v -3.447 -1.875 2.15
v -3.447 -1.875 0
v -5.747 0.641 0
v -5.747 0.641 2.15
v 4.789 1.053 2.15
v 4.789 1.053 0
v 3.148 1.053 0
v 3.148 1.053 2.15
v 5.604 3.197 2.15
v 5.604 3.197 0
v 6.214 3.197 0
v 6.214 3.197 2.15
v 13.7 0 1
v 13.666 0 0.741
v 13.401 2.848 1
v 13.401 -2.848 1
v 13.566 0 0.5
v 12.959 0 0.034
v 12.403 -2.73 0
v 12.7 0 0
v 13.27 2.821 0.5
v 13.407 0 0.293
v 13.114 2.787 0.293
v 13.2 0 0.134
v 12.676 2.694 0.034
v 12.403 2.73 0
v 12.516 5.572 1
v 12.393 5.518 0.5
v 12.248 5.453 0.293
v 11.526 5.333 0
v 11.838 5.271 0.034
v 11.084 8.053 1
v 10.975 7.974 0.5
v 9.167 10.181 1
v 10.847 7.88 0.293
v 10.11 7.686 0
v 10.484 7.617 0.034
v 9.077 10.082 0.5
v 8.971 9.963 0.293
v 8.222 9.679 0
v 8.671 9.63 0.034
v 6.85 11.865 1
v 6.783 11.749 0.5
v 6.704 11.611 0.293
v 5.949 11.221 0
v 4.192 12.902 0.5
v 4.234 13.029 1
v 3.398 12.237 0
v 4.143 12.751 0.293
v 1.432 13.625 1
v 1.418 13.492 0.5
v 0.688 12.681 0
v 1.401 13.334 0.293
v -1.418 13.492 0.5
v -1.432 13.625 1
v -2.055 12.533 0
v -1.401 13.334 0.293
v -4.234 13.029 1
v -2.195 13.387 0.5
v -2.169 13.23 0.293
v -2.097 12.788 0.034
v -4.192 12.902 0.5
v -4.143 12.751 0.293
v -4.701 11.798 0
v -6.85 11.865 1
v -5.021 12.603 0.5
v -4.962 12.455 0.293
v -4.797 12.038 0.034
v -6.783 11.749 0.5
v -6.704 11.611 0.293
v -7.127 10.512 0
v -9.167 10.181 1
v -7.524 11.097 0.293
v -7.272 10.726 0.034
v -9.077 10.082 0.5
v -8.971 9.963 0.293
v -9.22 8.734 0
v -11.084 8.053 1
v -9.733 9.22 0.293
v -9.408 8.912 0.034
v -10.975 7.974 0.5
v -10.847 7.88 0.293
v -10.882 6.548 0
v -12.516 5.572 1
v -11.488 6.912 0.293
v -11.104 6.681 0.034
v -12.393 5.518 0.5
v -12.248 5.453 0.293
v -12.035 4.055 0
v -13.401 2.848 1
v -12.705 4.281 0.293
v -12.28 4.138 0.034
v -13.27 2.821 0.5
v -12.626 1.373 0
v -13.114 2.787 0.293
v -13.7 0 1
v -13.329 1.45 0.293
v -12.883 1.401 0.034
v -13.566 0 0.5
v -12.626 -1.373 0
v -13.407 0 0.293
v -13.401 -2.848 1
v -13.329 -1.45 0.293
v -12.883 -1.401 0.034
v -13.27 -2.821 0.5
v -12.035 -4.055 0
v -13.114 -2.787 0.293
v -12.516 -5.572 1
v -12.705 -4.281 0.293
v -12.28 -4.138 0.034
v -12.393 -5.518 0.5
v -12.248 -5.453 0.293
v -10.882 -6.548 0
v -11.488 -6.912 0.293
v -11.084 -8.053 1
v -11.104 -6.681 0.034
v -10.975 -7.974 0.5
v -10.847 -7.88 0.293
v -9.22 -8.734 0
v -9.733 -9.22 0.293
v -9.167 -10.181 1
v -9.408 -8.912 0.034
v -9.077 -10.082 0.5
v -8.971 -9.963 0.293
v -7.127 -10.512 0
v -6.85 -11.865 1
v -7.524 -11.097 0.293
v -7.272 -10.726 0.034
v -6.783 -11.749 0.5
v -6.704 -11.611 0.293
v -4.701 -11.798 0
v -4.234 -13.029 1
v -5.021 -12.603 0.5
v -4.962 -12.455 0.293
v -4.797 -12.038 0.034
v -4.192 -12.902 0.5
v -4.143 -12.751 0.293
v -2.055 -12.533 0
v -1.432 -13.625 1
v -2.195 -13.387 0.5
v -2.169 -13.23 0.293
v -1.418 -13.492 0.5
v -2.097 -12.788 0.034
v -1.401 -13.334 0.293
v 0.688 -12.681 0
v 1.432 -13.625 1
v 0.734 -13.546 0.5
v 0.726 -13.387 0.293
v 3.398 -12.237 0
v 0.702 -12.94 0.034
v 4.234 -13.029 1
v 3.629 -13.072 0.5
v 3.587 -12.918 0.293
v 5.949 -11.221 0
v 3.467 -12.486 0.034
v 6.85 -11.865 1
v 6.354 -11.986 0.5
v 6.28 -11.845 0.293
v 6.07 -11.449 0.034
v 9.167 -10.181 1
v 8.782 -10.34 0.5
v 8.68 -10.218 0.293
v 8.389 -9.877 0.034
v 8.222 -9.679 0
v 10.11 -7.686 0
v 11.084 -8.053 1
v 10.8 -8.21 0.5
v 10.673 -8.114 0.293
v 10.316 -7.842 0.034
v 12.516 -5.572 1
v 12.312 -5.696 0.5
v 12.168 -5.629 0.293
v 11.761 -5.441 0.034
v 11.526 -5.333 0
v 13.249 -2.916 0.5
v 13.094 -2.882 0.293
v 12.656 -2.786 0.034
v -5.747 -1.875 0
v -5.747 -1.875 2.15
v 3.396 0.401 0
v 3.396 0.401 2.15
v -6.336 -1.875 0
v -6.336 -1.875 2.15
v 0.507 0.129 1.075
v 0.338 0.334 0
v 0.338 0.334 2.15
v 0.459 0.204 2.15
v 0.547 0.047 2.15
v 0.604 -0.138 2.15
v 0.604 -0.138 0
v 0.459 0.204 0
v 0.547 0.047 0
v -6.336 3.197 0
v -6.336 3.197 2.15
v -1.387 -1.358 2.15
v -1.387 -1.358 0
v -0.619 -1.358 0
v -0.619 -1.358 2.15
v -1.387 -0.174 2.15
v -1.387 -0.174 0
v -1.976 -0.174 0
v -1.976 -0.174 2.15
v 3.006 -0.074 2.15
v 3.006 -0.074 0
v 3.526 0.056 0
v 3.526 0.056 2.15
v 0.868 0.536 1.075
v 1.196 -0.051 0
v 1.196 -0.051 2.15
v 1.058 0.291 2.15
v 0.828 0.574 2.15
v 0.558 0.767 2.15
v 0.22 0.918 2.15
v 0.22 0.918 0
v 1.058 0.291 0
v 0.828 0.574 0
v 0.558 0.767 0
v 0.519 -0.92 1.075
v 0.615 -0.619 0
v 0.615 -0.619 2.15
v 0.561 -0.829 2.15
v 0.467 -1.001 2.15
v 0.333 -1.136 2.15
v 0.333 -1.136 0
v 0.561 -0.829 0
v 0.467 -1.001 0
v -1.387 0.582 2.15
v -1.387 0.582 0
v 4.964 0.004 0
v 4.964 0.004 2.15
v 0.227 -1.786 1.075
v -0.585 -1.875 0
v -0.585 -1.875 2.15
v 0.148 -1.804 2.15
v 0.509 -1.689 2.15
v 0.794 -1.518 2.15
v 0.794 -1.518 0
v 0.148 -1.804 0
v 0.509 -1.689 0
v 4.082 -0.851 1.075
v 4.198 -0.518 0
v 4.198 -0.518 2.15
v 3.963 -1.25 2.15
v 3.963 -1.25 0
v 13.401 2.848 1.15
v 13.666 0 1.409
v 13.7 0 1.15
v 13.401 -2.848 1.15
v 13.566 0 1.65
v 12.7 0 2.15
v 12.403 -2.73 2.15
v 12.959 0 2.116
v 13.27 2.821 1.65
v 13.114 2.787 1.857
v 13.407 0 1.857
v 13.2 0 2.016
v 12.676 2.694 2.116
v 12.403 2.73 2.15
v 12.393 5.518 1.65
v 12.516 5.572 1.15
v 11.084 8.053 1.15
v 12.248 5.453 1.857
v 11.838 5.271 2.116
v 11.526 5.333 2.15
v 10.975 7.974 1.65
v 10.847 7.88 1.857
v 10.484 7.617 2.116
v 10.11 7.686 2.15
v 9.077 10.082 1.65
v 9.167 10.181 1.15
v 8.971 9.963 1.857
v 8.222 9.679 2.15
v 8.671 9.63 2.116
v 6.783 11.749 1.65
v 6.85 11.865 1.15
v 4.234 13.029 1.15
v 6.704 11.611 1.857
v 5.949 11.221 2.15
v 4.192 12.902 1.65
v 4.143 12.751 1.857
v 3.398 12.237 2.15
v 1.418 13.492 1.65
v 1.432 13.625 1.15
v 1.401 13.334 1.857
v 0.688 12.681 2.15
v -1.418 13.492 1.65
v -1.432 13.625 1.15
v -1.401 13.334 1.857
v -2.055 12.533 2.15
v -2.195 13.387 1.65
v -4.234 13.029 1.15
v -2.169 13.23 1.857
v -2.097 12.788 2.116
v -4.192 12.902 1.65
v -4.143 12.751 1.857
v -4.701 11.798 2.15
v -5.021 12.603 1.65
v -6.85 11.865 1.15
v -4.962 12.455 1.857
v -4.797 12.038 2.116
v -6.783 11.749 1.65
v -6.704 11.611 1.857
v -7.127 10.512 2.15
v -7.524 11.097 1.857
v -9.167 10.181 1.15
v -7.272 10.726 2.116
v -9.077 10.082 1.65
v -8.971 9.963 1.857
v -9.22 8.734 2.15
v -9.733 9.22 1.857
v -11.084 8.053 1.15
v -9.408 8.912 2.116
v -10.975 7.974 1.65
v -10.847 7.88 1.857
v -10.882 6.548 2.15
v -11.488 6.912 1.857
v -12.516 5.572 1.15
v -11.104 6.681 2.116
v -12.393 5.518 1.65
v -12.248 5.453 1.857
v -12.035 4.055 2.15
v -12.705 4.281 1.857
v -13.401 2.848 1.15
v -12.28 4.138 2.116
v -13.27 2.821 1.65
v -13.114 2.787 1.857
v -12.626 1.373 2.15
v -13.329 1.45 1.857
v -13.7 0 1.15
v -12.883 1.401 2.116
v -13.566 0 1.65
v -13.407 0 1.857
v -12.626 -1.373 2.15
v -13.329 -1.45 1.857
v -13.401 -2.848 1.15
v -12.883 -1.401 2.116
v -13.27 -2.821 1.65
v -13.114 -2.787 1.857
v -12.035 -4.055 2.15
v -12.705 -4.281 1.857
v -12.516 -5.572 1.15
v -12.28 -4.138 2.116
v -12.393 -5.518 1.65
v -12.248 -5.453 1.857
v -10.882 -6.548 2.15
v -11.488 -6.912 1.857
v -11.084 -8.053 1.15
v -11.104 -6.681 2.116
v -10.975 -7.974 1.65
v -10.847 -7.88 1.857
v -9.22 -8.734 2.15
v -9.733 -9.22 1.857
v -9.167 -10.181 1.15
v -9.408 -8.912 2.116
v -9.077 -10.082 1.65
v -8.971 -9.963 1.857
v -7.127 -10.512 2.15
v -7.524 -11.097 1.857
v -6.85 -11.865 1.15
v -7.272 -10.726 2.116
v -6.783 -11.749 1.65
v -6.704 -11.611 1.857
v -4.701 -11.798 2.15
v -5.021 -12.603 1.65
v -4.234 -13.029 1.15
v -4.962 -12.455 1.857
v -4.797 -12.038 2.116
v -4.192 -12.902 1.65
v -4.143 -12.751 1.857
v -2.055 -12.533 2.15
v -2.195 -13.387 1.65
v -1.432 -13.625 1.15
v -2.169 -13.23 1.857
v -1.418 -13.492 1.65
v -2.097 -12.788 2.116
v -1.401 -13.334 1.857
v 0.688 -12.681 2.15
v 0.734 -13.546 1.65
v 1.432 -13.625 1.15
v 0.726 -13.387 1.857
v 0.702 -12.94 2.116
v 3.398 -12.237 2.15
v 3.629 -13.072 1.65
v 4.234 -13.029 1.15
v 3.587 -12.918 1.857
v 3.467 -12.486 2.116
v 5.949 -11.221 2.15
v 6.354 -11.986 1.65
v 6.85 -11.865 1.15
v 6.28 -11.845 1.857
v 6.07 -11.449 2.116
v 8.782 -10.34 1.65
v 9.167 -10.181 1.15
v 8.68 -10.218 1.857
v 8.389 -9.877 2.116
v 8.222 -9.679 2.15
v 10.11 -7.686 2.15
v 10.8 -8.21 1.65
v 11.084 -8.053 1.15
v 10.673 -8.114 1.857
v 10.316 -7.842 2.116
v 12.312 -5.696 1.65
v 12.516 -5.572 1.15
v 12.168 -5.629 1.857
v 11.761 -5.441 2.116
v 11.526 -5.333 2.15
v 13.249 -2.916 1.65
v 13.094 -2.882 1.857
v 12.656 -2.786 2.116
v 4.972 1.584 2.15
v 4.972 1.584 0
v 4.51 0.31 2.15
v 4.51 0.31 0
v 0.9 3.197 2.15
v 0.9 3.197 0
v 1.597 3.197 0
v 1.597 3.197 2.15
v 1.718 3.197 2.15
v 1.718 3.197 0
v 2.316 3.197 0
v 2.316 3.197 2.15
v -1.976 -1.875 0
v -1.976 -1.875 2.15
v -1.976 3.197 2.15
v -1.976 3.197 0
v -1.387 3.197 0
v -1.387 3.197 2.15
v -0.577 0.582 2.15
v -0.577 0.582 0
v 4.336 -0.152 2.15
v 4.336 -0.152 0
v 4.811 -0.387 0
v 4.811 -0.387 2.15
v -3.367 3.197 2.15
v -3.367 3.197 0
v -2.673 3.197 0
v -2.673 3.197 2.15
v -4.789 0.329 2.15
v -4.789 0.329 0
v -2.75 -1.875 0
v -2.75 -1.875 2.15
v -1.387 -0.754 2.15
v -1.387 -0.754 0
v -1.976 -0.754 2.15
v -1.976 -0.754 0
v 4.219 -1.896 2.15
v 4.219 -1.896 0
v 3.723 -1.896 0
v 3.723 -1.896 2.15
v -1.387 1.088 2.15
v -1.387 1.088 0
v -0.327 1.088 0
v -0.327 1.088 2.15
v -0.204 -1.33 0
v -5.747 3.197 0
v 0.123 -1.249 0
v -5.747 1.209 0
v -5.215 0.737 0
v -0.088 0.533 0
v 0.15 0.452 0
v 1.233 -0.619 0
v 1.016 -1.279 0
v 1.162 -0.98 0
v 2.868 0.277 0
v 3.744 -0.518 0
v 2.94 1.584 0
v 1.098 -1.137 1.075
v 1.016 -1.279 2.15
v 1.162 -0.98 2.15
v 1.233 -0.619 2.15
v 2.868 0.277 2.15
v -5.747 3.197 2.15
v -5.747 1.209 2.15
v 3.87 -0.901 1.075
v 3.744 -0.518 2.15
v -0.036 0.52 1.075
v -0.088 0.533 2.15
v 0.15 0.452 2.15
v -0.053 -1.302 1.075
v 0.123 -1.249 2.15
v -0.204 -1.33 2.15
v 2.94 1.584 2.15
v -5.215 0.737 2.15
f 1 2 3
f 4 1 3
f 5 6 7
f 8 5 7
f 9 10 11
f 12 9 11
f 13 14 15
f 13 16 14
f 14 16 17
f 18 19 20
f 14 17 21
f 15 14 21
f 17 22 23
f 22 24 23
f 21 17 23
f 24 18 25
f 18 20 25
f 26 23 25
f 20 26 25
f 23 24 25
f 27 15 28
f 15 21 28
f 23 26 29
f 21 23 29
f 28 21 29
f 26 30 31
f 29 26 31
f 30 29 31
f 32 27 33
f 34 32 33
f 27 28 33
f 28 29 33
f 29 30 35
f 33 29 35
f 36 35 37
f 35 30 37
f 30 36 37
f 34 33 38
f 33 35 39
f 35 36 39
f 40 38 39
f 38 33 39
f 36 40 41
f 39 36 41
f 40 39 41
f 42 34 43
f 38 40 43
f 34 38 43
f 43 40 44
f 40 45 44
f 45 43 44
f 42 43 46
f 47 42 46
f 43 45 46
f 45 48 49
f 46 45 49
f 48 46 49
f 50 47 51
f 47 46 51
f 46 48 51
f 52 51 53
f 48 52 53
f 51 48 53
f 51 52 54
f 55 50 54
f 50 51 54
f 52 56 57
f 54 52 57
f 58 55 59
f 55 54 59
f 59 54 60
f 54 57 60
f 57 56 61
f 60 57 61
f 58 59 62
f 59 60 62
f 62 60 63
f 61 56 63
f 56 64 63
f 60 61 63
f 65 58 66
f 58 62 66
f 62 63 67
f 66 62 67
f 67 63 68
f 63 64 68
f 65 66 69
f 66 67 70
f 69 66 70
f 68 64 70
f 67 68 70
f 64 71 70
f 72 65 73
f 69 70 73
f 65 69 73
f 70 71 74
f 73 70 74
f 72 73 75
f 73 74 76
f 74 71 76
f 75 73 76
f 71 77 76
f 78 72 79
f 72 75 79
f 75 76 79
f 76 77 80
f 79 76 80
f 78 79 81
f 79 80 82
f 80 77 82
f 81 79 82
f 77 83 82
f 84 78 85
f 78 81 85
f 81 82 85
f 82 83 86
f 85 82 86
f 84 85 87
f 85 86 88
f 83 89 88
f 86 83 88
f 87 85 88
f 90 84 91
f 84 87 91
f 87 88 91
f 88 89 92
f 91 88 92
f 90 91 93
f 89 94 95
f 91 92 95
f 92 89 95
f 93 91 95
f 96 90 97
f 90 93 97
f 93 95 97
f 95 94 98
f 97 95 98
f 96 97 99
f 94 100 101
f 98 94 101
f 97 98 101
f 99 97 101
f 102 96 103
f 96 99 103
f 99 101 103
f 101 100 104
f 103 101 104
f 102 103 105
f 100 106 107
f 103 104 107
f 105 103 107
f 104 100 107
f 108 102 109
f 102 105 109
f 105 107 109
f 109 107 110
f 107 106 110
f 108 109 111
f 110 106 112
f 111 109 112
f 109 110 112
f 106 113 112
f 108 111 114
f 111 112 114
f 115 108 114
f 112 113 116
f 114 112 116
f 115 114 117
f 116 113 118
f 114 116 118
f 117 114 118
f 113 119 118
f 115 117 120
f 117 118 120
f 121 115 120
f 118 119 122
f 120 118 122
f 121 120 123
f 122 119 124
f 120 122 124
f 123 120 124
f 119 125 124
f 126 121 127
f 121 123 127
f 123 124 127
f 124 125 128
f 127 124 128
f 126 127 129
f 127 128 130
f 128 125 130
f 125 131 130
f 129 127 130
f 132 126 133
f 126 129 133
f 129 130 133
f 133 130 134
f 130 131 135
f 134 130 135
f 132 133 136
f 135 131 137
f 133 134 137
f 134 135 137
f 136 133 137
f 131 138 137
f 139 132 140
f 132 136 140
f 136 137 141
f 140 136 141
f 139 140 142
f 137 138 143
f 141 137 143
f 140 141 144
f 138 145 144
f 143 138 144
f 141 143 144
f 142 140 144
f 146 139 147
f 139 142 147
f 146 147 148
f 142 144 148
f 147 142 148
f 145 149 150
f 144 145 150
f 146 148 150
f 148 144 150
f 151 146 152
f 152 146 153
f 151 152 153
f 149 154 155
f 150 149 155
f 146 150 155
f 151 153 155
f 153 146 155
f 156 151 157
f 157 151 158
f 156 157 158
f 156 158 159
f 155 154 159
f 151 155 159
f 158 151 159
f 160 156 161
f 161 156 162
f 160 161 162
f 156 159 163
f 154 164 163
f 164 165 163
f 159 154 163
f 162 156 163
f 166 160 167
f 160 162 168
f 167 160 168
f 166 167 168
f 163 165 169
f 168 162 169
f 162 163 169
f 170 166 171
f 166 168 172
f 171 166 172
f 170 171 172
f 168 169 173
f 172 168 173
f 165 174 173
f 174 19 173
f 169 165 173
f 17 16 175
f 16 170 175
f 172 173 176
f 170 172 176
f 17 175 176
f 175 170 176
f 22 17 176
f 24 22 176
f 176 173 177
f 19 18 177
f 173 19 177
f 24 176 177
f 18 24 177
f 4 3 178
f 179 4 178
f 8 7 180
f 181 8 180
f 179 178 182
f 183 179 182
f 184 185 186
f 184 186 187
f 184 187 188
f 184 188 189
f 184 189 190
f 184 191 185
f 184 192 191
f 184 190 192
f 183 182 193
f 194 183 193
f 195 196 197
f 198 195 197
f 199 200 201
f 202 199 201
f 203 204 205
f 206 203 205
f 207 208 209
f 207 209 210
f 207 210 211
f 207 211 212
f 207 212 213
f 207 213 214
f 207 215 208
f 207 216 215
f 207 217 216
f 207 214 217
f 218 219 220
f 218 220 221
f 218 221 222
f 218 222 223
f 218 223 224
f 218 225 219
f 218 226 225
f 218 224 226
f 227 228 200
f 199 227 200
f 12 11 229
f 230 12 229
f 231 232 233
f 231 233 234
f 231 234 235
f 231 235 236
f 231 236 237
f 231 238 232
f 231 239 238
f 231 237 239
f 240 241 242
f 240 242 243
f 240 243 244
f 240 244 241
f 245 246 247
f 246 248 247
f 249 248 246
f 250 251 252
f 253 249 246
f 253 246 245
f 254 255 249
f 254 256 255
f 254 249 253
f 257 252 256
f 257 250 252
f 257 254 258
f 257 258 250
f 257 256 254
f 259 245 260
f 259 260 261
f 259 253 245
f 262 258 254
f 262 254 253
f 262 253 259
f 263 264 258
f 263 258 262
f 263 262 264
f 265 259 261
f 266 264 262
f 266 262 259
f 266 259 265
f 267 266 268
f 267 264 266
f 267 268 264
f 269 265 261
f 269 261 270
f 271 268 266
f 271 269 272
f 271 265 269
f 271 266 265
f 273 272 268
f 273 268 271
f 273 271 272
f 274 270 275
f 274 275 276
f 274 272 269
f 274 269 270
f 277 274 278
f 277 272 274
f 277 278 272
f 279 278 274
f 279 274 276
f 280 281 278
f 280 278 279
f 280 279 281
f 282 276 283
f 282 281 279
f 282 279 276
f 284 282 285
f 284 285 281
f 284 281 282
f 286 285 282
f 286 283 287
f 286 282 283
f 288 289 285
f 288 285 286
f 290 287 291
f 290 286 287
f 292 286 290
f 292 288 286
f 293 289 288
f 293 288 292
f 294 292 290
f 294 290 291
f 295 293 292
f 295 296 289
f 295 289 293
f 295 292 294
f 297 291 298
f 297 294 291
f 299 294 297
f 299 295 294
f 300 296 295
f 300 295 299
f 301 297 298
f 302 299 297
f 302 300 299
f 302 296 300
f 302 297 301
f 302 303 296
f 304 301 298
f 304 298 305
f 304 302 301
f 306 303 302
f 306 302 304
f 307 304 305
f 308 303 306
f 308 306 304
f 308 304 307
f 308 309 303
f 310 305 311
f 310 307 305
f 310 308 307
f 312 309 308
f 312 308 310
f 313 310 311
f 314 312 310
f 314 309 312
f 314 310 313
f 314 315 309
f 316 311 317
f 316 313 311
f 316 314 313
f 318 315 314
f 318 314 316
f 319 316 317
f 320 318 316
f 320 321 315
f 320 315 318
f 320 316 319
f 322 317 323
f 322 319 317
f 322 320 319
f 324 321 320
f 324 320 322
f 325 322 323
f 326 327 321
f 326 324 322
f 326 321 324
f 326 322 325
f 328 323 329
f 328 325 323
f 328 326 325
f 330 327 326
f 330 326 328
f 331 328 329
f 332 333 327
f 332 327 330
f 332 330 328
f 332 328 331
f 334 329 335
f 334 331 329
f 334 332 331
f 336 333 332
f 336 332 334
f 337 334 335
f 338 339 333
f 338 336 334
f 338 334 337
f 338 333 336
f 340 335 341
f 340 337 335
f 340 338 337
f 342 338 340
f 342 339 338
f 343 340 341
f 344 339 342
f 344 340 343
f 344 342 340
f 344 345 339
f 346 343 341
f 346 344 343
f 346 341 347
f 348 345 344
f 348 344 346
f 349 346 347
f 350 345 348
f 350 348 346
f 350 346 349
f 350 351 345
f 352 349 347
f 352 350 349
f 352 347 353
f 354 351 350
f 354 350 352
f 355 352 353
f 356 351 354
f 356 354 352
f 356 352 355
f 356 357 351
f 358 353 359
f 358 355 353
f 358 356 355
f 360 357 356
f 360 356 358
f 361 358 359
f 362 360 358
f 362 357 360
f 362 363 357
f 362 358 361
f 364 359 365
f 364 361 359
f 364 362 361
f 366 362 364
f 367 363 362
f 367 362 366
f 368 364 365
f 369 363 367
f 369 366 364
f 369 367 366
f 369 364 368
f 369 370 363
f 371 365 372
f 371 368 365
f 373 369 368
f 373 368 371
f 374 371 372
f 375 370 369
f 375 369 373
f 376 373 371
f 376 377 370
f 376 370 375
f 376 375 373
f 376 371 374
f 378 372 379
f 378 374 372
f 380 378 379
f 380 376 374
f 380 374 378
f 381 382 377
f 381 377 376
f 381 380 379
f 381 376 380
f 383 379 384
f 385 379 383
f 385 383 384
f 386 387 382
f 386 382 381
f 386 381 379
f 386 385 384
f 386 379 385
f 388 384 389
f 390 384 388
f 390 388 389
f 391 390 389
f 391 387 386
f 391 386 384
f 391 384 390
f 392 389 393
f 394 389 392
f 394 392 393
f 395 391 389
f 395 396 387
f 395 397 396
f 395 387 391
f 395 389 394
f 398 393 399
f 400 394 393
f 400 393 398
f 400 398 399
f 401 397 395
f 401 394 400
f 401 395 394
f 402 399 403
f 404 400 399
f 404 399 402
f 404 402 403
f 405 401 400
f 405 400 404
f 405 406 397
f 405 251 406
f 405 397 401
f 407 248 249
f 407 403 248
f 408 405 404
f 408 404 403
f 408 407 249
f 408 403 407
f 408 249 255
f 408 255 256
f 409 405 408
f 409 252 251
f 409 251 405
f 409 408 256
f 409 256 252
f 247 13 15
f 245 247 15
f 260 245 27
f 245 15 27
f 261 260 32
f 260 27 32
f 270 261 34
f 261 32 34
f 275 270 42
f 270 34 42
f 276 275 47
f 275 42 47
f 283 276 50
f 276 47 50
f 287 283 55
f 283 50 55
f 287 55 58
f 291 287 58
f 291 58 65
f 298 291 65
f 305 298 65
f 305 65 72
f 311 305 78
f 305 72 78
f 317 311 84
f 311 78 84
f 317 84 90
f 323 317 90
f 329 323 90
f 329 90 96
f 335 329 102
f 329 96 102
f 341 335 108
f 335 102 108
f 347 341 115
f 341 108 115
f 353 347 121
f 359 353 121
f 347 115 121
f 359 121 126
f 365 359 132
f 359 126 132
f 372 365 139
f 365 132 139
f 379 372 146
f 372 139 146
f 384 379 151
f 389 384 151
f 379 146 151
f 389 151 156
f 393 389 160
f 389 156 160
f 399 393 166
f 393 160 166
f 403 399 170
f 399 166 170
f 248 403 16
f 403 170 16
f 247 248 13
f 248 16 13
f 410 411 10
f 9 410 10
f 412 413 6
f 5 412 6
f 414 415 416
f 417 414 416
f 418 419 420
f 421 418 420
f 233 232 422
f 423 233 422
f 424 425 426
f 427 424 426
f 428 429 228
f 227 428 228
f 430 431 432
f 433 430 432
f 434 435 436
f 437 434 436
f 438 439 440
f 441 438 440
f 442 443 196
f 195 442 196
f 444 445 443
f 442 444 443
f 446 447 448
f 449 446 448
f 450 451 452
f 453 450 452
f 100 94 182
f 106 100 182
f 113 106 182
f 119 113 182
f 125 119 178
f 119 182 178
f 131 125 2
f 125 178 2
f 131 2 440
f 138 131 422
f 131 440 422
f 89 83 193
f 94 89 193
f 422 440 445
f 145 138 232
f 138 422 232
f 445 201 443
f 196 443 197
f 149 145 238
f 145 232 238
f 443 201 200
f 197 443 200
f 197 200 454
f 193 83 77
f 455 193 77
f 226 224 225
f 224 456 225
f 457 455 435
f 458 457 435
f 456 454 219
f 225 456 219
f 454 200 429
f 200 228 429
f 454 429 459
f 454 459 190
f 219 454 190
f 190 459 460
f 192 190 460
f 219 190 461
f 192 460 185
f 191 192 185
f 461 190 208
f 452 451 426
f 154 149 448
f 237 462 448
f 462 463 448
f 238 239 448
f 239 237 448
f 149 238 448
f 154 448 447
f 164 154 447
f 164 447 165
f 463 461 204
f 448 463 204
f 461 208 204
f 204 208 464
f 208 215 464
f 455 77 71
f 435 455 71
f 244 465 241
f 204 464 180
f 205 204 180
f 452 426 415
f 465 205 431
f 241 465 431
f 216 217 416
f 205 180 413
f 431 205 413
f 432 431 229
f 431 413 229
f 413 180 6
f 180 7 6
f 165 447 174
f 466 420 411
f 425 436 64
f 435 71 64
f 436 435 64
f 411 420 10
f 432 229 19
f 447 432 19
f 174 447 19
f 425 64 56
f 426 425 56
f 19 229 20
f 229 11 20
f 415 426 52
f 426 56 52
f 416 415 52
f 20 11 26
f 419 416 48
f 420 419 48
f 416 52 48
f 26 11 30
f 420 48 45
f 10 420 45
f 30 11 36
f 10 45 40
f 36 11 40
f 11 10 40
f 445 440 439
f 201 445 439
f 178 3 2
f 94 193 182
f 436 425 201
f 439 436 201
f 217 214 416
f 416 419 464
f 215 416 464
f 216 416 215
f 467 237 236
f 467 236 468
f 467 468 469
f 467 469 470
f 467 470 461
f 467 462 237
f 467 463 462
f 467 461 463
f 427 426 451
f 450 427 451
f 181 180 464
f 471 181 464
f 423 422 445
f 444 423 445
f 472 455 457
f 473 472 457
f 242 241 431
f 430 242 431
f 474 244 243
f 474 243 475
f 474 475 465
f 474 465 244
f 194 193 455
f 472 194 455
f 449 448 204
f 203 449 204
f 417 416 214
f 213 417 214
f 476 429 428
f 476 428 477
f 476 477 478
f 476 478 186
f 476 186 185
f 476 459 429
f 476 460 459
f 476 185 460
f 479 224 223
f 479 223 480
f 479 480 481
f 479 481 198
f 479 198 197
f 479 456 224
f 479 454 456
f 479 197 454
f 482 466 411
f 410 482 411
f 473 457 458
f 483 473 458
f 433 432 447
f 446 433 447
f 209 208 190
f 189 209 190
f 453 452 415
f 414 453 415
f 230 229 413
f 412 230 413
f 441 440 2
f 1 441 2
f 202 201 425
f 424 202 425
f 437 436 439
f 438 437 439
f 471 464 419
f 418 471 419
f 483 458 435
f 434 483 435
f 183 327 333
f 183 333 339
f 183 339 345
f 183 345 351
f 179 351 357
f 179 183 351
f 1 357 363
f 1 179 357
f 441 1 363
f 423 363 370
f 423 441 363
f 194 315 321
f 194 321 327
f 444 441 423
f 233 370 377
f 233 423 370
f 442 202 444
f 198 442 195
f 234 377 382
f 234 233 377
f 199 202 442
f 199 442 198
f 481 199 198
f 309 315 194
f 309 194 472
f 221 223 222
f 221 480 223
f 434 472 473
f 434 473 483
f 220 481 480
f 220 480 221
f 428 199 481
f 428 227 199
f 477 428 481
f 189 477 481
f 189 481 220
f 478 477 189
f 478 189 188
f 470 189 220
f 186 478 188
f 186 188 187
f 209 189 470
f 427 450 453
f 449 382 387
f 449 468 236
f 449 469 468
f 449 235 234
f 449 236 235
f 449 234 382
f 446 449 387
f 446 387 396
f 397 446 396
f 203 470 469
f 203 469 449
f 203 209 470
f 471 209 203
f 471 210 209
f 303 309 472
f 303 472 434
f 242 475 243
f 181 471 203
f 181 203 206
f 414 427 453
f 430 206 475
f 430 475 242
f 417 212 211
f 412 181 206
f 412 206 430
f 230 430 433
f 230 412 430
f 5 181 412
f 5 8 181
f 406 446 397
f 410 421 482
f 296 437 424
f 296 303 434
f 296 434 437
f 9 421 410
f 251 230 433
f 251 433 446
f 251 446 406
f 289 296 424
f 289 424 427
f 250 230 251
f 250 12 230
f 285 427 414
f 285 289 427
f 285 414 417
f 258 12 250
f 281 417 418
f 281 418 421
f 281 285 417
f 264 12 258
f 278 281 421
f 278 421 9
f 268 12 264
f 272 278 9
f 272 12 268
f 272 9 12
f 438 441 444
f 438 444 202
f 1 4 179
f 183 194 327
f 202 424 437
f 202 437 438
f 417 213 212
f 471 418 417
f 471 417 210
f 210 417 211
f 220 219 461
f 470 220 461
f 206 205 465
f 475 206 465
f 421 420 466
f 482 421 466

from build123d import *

# Parameters (mm, degrees)
F0_R     = 13.7
F1_DEPTH = 2.15
F2_R     = 1
F4_DEPTH = 2.15


with BuildPart() as f1:
    # F0 (on Top) → F1 (new body)
    with BuildSketch(Plane.XY):
        Circle(F0_R)
    extrude(amount=F1_DEPTH)

    # F2
    f2_edges = [f1.edges().sort_by_distance(p)[0] for p in [
        (-13.7, 0, 2.15),
        (-13.7, 0, 0),
    ]]
    fillet(f2_edges, radius=F2_R)

    # F3 (on face) → F4 (cut, through all)
    with BuildSketch(Plane(origin=(0, 0, 0), x_dir=(1, 0, 0), z_dir=(0, 0, -1))):
        Polygon((-3.3669322911, -3.197086975), (-2.673119963, -3.197086975), (-4.7889700387, -0.3285892857), (-2.749716844, 1.8749586682), (-3.4468594713, 1.8749586682), (-5.7469861014, -0.6405273085), (-5.7469861014, 1.8749586682), (-6.3364490553, 1.8749586682), (-6.3364490553, -3.197086975), (-5.7469861014, -3.197086975), (-5.7469861014, -1.2088983676), (-5.2152483331, -0.7371059845), align=None)
        with BuildLine():
            Line((1.1957695829, 0.0513130465), (0.6036887334, 0.1377061204))
            add(Edge.make_bspline(
                [(0.3380255409, -0.3335847345), (0.5428237209, -0.1592137126), (0.6036887334, 0.1377061204)],
                knots=[0, 0, 0, 0.7028049152, 0.7028049152, 0.7028049152], degree=2))
            add(Edge.make_bspline(
                [(-0.5772516823, -0.581692023), (0.0466243631, -0.581692023), (0.3380255409, -0.3335847345)],
                knots=[0, 0, 0, 1, 1, 1], degree=2))
            Line((-0.5772516823, -0.581692023), (-1.3865143818, -0.581692023))
            Line((-1.3865143818, -0.581692023), (-1.3865143818, 0.17412538))
            Line((-1.3865143818, 0.17412538), (-1.9759773358, 0.17412538))
            Line((-1.9759773358, 0.17412538), (-1.9759773358, -3.197086975))
            Line((-1.9759773358, -3.197086975), (-1.3865143818, -3.197086975))
            Line((-1.3865143818, -3.197086975), (-1.3865143818, -1.0878974976))
            Line((-1.3865143818, -1.0878974976), (-0.3274792442, -1.0878974976))
            Line((-0.3274792442, -1.0878974976), (0.9002910515, -3.197086975))
            Line((0.9002910515, -3.197086975), (1.5974336788, -3.197086975))
            Line((1.5974336788, -3.197086975), (0.2197999202, -0.9180522397))
            add(Edge.make_bspline(
                [(1.1957695829, 0.0513130465), (1.0276039433, -0.6376501903), (0.2197999202, -0.9180522397)],
                knots=[0.2081762837, 0.2081762837, 0.2081762837, 1, 1, 1], degree=2))
        make_face()
        with BuildLine():
            add(Edge.make_bspline(
                [(0.6149774989, 0.619108323), (0.5639843778, 0.9626327865), (0.3330300921, 1.1356322514)],
                knots=[0.2207931367, 0.2207931367, 0.2207931367, 1, 1, 1], degree=2))
            Line((0.6149774989, 0.619108323), (1.2327357734, 0.619108323))
            add(Edge.make_bspline(
                [(0.7942765278, 1.5175065568), (1.1831529928, 1.2056305376), (1.2327357734, 0.619108323)],
                knots=[0, 0, 0, 0.872497348, 0.872497348, 0.872497348], degree=2))
            add(Edge.make_bspline(
                [(-0.5850223804, 1.8749586682), (0.3485714883, 1.8749586682), (0.7942765278, 1.5175065568)],
                knots=[0, 0, 0, 1, 1, 1], degree=2))
            Line((-0.5850223804, 1.8749586682), (-1.9759773358, 1.8749586682))
            Line((-1.9759773358, 1.8749586682), (-1.9759773358, 0.7536415942))
            Line((-1.9759773358, 0.7536415942), (-1.3865143818, 0.7536415942))
            Line((-1.3865143818, 0.7536415942), (-1.3865143818, 1.3576521964))
            Line((-1.3865143818, 1.3576521964), (-0.6194354719, 1.3576521964))
            add(Edge.make_bspline(
                [(0.3330300921, 1.1356322514), (0.0366334655, 1.3576521964), (-0.6194354719, 1.3576521964)],
                knots=[0, 0, 0, 1, 1, 1], degree=2))
        make_face()
        with BuildLine():
            Line((3.7232746521, 1.896050563), (3.0058799547, 0.0735661382))
            Line((3.0058799547, 0.0735661382), (3.5263660581, -0.0564224731))
            Line((3.5263660581, -0.0564224731), (3.7443665468, 0.5184168044))
            add(Edge.make_bspline(
                [(3.9630561926, 1.2499725231), (3.8864593116, 0.9169426056), (3.7443665468, 0.5184168044)],
                knots=[0, 0, 0, 1, 1, 1], degree=2))
            add(Edge.make_bspline(
                [(4.1983973343, 0.5184168044), (4.0840570627, 0.8170336304), (3.9630561926, 1.2499725231)],
                knots=[0, 0, 0, 1, 1, 1], degree=2))
            Line((4.1983973343, 0.5184168044), (4.3359644272, 0.1522607828))
            Line((4.3359644272, 0.1522607828), (4.810570116, 0.3869358669))
            Line((4.810570116, 0.3869358669), (4.2194892291, 1.896050563))
            Line((4.2194892291, 1.896050563), (3.7232746521, 1.896050563))
        make_face()
        Polygon((3.3957695214, -0.40078876), (2.8680717842, -0.2765246073), (1.7184345488, -3.197086975), (2.3156682008, -3.197086975), (2.9395442462, -1.5841120746), (4.9721368426, -1.5841120746), (5.6037835861, -3.197086975), (6.2143384348, -3.197086975), (4.9638303876, -0.0043596959), (4.5097831967, -0.3103846639), (4.788970388, -1.0534844061), (3.1482429945, -1.0534844061), align=None)
    extrude(amount=-F4_DEPTH, mode=Mode.SUBTRACT)


solid = f1.part
